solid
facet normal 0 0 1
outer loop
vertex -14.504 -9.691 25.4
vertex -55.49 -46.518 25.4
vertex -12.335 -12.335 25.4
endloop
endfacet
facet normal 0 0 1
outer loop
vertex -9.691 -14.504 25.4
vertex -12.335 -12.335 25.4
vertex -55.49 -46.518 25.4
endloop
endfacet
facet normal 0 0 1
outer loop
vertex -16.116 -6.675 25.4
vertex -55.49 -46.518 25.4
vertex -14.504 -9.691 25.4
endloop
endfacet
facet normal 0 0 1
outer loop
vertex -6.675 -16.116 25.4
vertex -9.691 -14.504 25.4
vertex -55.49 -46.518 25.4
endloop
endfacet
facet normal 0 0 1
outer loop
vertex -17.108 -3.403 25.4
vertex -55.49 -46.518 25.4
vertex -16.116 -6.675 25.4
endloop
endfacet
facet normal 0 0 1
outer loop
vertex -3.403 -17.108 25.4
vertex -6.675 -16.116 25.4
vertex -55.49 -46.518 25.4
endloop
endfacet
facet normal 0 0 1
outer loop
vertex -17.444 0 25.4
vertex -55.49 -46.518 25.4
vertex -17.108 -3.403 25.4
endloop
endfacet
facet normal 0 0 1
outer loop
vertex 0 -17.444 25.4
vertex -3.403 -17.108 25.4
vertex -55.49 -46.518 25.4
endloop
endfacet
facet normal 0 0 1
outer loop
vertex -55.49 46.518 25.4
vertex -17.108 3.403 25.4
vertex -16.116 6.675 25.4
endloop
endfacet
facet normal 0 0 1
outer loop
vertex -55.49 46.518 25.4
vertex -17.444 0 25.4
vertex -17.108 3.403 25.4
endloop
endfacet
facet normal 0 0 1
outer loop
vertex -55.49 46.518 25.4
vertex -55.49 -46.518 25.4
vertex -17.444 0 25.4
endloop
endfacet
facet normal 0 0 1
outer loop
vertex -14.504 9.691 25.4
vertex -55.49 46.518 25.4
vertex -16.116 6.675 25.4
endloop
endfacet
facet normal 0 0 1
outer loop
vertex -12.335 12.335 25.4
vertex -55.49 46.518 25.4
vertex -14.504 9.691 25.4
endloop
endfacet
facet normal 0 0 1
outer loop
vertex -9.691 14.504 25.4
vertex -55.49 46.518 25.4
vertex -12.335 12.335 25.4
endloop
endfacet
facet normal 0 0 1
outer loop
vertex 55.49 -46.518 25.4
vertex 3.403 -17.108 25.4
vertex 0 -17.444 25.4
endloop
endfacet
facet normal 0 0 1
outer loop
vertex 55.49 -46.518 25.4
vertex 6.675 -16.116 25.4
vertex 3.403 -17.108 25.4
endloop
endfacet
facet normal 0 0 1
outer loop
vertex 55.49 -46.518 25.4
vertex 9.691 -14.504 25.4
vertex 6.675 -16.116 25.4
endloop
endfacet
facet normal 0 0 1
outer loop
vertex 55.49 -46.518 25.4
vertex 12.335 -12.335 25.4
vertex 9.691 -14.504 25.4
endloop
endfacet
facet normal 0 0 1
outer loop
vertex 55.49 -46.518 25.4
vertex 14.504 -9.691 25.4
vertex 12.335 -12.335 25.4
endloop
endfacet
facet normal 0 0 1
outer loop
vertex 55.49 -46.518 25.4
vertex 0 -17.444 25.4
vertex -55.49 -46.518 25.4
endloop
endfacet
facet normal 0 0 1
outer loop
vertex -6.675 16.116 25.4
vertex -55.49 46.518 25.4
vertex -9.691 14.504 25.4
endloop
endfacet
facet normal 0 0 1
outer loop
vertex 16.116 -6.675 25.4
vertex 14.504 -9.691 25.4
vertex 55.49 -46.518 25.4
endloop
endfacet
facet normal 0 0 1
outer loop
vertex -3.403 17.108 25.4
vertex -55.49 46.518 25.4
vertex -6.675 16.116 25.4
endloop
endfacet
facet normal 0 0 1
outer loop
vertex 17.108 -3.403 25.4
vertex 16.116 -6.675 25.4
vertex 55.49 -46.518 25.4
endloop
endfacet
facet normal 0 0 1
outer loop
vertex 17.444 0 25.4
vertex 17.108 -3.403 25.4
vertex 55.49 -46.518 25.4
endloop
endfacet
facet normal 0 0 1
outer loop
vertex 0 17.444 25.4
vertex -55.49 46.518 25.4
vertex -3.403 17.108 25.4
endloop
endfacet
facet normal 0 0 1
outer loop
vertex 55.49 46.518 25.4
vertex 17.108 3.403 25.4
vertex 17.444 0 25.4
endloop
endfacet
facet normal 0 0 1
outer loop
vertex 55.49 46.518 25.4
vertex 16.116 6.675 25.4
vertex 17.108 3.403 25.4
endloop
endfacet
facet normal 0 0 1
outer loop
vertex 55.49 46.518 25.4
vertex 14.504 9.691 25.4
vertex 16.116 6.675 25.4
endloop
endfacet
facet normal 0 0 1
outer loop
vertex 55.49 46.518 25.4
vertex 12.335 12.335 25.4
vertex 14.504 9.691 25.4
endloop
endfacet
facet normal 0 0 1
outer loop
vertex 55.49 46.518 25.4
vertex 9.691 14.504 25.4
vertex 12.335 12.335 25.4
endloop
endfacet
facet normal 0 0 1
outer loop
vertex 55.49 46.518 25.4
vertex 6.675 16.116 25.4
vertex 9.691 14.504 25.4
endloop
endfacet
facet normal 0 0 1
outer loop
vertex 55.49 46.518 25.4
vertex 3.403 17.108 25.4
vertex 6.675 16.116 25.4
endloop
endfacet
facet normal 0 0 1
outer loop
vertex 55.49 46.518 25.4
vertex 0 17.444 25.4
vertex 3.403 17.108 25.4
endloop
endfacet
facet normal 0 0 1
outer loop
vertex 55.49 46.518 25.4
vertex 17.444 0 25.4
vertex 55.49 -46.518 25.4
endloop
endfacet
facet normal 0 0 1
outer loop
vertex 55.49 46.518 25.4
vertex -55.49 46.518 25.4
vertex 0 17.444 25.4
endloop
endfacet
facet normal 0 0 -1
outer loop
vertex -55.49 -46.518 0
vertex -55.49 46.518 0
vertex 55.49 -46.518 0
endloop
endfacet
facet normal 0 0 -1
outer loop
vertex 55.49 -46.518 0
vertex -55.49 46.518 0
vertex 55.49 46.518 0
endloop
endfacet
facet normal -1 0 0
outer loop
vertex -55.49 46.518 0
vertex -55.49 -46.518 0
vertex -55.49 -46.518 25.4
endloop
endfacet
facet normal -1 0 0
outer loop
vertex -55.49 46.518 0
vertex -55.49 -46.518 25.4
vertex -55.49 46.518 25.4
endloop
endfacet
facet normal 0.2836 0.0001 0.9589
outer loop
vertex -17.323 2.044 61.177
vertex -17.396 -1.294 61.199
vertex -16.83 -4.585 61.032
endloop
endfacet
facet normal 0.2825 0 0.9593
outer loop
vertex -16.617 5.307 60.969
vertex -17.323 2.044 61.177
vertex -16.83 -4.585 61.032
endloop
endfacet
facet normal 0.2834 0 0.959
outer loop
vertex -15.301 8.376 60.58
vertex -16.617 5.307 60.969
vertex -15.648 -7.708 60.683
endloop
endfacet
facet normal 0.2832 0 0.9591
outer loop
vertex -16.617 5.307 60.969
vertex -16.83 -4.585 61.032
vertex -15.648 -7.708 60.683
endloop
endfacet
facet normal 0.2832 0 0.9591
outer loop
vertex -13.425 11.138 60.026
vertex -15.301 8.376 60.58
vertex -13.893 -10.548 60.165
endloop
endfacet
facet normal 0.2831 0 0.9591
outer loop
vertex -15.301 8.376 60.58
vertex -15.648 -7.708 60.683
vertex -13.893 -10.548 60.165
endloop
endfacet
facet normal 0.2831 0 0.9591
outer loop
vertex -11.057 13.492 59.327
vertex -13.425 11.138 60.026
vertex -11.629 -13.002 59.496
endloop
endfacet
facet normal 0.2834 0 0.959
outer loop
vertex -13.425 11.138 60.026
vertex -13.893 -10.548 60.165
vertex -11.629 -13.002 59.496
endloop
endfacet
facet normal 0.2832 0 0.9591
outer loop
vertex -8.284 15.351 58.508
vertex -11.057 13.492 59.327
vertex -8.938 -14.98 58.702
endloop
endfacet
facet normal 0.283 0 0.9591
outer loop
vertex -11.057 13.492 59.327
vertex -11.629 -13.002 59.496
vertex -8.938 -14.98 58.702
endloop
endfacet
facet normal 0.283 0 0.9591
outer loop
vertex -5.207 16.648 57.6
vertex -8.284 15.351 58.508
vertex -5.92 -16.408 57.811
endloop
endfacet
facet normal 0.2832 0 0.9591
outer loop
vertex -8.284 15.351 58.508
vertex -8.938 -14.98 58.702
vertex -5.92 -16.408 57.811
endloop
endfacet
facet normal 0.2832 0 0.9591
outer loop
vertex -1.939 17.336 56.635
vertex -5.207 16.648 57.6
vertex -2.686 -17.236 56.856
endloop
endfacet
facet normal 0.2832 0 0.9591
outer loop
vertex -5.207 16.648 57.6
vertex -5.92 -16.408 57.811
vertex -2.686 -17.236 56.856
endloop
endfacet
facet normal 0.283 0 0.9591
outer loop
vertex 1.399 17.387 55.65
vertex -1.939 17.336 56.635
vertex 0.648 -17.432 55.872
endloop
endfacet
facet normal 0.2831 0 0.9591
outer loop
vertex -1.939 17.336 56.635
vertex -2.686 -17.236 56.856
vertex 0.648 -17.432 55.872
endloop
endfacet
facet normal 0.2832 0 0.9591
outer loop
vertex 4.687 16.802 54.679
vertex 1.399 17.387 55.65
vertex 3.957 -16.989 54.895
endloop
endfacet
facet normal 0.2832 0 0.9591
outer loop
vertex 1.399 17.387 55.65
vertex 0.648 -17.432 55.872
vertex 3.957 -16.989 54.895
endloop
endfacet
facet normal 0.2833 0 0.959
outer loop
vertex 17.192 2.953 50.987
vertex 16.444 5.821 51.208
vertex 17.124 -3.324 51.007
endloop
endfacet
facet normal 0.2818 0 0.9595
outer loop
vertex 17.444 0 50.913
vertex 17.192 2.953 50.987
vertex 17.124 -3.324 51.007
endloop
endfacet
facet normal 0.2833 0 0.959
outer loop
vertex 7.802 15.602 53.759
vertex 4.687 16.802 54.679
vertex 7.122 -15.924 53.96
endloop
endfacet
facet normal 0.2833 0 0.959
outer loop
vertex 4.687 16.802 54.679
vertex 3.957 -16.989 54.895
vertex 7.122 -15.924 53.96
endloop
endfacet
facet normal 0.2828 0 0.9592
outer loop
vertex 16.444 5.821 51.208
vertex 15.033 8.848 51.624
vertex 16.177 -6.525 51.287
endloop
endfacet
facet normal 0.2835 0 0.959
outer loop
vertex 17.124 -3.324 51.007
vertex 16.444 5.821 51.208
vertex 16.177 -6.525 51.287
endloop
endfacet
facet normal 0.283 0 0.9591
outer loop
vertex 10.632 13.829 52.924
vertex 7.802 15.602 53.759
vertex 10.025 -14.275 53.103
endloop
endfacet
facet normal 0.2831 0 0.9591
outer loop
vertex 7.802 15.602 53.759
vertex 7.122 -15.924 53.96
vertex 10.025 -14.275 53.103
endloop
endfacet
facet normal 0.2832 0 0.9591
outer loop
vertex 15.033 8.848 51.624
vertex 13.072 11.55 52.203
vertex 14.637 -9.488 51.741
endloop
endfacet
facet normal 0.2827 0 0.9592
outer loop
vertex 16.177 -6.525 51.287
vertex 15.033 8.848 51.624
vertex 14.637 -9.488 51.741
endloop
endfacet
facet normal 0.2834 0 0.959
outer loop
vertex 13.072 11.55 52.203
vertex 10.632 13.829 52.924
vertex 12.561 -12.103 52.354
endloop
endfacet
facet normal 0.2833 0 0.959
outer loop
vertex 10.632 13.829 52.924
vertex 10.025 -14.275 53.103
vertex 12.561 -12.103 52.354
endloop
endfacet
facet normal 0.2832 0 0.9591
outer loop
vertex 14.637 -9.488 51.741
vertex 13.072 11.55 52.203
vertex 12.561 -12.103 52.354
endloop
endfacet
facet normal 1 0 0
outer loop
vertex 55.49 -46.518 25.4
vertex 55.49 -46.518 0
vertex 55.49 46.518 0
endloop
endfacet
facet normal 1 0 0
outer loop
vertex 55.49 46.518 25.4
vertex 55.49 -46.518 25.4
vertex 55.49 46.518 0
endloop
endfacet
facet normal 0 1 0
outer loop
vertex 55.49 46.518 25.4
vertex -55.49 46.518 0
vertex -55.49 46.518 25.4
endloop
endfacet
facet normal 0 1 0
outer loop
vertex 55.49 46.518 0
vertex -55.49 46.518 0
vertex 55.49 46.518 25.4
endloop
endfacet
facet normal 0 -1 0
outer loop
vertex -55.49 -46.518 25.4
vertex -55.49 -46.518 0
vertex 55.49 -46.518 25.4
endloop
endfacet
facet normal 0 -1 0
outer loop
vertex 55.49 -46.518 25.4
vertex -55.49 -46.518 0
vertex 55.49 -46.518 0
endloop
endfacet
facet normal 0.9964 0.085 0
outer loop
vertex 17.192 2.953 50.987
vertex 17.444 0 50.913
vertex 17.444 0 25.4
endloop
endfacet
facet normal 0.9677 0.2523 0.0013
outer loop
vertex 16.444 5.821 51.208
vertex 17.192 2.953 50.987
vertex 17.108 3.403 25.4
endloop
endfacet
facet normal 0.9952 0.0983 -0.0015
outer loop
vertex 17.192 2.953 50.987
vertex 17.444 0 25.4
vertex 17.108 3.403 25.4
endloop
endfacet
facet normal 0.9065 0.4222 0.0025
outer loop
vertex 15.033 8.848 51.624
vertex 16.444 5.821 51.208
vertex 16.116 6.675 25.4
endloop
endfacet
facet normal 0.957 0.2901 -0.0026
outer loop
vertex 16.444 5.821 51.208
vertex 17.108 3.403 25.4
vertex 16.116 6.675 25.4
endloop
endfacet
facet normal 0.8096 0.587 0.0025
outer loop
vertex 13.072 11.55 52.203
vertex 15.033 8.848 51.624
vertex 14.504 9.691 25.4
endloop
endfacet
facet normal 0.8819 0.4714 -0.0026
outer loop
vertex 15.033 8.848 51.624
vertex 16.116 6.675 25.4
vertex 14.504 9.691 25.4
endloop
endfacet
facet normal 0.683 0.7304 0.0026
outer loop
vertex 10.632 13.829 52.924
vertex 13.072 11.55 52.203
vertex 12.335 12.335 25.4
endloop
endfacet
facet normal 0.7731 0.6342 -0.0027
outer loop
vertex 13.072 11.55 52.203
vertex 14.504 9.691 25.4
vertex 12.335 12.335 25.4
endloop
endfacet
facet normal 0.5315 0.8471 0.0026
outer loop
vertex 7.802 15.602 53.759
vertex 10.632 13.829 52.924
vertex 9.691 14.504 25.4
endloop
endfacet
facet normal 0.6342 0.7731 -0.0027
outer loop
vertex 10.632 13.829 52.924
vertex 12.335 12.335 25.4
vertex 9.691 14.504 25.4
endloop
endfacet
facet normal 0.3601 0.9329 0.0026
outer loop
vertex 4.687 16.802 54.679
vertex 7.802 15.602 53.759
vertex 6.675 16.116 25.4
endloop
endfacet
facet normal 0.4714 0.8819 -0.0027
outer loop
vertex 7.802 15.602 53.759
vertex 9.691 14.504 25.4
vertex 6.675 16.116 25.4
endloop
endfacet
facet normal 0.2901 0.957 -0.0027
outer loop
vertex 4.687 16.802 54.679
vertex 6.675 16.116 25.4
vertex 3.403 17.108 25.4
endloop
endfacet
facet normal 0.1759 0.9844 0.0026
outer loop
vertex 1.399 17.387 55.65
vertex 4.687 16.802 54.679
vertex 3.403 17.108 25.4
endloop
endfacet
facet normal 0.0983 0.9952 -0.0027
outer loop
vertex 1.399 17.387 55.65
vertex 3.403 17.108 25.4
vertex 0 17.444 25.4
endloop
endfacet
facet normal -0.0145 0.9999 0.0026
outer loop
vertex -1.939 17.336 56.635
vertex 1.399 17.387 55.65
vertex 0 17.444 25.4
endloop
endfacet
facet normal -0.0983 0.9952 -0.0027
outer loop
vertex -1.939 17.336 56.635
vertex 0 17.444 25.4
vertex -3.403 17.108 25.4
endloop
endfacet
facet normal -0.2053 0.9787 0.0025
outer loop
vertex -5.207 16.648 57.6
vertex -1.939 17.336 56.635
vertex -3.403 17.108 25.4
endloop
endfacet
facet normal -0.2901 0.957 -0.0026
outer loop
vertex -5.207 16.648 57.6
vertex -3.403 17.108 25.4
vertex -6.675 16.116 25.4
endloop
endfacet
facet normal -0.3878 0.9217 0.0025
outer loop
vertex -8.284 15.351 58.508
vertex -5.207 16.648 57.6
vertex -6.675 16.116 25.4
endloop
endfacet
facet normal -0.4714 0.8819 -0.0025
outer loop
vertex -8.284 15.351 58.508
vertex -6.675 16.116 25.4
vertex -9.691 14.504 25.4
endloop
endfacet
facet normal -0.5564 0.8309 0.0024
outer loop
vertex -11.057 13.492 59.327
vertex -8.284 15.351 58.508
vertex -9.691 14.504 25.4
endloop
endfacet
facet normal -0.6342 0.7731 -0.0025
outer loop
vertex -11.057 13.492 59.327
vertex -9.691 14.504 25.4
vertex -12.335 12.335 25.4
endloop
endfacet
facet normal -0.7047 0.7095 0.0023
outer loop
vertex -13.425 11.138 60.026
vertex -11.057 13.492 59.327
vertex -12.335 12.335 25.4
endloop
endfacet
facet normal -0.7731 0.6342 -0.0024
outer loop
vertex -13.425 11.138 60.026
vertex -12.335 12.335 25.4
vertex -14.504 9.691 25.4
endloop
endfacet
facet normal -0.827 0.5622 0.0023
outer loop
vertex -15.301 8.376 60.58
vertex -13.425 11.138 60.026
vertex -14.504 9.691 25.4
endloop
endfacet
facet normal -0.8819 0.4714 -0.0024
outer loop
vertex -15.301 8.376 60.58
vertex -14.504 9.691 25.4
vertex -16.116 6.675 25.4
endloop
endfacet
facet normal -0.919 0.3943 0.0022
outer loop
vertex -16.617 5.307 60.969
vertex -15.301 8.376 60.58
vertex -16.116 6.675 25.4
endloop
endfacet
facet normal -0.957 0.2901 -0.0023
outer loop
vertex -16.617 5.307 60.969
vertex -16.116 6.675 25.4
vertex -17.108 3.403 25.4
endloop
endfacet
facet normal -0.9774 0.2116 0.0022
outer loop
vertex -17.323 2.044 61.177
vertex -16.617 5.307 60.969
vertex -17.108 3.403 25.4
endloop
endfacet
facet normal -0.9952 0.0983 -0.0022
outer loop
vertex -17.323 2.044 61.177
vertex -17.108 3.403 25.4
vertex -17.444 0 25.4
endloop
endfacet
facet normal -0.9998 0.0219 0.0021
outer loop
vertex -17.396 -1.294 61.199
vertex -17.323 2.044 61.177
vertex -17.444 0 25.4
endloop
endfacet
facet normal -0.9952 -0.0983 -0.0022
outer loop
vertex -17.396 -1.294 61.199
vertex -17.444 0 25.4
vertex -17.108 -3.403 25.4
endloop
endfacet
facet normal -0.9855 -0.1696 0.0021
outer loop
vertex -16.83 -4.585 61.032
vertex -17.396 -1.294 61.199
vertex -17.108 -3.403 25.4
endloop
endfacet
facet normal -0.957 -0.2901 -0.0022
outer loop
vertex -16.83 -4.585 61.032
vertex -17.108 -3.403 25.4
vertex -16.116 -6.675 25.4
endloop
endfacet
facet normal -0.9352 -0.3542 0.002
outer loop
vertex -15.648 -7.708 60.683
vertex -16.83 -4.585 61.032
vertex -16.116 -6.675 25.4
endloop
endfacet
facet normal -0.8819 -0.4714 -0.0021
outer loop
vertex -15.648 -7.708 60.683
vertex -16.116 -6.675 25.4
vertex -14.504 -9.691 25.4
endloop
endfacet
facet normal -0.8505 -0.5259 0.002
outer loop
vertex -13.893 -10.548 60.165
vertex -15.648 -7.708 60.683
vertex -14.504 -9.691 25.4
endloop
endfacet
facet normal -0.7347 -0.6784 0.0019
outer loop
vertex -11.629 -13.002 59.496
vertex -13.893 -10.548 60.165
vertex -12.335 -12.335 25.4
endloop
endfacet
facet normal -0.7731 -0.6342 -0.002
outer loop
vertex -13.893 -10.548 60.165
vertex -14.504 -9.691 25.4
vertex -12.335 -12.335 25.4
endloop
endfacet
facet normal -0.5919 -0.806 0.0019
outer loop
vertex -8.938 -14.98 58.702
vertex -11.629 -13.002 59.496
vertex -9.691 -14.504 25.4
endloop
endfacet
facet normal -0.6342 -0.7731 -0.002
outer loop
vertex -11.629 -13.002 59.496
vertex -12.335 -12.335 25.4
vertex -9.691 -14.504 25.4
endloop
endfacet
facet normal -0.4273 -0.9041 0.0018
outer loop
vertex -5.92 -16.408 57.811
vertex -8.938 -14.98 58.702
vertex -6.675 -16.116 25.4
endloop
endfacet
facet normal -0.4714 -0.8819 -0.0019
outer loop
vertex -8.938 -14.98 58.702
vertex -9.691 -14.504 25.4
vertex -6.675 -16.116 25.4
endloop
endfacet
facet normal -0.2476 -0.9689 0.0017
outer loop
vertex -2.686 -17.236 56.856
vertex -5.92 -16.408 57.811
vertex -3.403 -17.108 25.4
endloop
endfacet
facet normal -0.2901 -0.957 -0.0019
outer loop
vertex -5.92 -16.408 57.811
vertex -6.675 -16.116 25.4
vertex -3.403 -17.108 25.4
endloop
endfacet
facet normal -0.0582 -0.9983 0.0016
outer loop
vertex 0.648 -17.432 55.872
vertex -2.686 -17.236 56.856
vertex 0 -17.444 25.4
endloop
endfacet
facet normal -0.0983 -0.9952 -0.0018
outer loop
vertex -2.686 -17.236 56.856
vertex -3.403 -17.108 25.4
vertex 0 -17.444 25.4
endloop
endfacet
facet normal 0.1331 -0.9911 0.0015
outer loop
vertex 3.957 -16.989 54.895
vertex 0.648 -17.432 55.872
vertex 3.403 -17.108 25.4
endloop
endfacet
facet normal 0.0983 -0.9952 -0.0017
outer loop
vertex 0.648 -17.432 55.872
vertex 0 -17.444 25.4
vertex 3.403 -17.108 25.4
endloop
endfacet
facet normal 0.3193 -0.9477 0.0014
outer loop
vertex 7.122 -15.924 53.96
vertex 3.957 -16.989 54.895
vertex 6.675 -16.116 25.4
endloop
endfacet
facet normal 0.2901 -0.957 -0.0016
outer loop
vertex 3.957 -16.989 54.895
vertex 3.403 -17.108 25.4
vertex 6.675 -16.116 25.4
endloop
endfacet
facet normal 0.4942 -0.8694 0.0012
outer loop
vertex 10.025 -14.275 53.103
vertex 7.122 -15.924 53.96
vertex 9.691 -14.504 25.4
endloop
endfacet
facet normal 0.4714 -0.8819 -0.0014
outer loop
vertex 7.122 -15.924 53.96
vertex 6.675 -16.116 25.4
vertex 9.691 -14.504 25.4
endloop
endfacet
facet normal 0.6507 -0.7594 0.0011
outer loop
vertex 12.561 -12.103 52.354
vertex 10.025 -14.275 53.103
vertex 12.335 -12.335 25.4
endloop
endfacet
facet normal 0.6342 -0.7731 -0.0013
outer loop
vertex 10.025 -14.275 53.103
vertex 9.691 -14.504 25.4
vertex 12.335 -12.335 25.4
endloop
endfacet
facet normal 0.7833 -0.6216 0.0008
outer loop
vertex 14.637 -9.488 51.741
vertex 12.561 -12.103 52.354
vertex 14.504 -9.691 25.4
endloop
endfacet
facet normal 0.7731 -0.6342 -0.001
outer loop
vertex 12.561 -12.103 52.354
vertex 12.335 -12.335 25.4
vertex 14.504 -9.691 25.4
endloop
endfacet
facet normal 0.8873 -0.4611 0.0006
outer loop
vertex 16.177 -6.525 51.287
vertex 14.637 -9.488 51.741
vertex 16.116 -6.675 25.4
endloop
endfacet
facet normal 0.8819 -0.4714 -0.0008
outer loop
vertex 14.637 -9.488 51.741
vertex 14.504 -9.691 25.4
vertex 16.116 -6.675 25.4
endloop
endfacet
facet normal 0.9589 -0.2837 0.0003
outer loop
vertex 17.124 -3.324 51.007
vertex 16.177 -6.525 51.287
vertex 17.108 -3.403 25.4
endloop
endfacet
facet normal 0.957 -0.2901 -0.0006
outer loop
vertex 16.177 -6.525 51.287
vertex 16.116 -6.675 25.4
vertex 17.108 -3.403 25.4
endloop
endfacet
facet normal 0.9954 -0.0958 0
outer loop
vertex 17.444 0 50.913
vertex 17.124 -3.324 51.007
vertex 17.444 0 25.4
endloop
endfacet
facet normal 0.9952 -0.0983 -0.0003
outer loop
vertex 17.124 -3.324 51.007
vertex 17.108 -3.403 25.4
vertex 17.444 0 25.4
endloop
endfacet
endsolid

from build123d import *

# Parameters (mm, degrees)
F0_W     = 110.979826
F0_H     = 93.036972
F1_DEPTH = 25.4
F2_R     = 17.443643
F3_DEPTH = 50.8
F6_DEPTH = 58.928


with BuildPart() as f1:
    # F0 (on Top) → F1 (new body)
    with BuildSketch(Plane.XY):
        Rectangle(F0_W, F0_H)
    extrude(amount=F1_DEPTH)

    # F2 (on face) → F3 (join)
    with BuildSketch(Plane.XY.offset(25.4)):
        Circle(F2_R)
    extrude(amount=F3_DEPTH)

    # F5 (on offset) → F6 (cut)
    with BuildSketch(Plane.XZ.offset(25.4)):
        Polygon((-31.497903, 79.689242), (-29.677777, 64.824864), (34.026667, 46.016887), (34.026667, 79.689242), align=None)
    extrude(amount=-F6_DEPTH, mode=Mode.SUBTRACT)


solid = f1.part
